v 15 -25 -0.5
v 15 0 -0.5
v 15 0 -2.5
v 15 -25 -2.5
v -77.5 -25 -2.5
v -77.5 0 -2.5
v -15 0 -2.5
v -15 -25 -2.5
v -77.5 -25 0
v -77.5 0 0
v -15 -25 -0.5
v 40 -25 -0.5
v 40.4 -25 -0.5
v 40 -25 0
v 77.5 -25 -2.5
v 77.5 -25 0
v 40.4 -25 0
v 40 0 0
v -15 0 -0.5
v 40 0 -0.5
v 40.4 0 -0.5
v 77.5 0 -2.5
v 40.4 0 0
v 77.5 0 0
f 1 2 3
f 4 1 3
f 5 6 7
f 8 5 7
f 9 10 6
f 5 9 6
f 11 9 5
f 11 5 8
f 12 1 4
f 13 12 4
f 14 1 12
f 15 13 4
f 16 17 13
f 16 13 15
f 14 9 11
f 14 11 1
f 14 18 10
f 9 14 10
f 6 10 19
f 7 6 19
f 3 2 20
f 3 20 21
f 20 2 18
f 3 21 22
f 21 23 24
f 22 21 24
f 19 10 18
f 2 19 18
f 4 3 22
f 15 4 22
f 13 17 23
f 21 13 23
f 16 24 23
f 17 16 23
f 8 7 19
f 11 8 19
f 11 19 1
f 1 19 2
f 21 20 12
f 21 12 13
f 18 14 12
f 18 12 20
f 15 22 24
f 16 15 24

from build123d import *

# Parameters (mm, degrees)
F1_DEPTH = 25
F2_W     = 0.4
F2_H     = 25
F3_DEPTH = 0.5


with BuildPart() as f1:
    # F0 (on Front) → F1 (new body)
    with BuildSketch(Plane.XZ):
        Polygon((77.5, 0), (-77.5, 0), (-77.5, -2.5), (-15, -2.5), (-15, -0.5), (15, -0.5), (15, -2.5), (77.5, -2.5), align=None)
    extrude(amount=F1_DEPTH)

    # F2 (on face) → F3 (cut, through all)
    with BuildSketch(Plane.XY):
        with Locations((40.2, -12.5)):
            Rectangle(F2_W, F2_H)
    extrude(amount=-F3_DEPTH, mode=Mode.SUBTRACT)


solid = f1.part
